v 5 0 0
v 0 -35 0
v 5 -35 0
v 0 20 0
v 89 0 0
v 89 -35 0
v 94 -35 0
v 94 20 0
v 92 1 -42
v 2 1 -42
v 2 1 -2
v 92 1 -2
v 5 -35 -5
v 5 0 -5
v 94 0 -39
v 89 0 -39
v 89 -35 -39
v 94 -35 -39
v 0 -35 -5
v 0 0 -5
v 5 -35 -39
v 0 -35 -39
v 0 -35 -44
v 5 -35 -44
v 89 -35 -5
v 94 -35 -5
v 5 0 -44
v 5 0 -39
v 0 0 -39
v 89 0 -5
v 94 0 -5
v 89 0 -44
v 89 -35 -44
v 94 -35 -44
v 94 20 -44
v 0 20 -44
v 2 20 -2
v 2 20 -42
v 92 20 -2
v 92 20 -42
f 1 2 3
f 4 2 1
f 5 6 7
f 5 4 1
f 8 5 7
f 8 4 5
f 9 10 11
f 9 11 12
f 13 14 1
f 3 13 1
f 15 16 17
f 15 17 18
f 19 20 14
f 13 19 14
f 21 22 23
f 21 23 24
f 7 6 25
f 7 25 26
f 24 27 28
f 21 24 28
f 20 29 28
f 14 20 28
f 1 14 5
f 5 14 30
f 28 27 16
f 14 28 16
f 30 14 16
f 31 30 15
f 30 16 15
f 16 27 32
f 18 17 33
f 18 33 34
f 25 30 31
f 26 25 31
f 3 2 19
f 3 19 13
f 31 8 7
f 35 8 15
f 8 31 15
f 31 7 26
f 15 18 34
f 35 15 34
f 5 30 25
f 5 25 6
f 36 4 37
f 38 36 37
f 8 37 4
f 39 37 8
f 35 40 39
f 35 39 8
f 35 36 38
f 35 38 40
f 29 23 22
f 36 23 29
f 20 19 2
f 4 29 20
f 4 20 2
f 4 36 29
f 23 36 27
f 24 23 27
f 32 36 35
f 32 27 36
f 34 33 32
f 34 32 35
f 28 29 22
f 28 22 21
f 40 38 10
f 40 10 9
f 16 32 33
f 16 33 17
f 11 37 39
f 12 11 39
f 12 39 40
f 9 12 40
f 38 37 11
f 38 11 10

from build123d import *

# Parameters (mm, degrees)
SKETCH_1_W          = 94
SKETCH_1_H          = 44
EXTRUDE_2_DEPTH     = 20
SKETCH_2_W          = 90
SKETCH_2_H          = 40
CUT_EXTRUDE_1_DEPTH = 19
SKETCH_3_W          = 5
SKETCH_3_H          = 5
EXTRUDE_3_DEPTH     = 35


with BuildPart() as part:
    # 草图1 → 凸台-拉伸2 (new body)
    with BuildSketch(Plane(origin=(0, 0, 0), x_dir=(1, 0, 0), z_dir=(0, 1, 0))):
        with Locations((47, 22)):
            Rectangle(SKETCH_1_W, SKETCH_1_H)
    extrude(amount=EXTRUDE_2_DEPTH)

    # 草图2 → 切除-拉伸1 (cut)
    with BuildSketch(Plane(origin=(0, 20, 0), x_dir=(1, 0, 0), z_dir=(0, 1, 0))):
        with Locations((47, 22)):
            Rectangle(SKETCH_2_W, SKETCH_2_H)
    extrude(amount=-CUT_EXTRUDE_1_DEPTH, mode=Mode.SUBTRACT)

    # 草图3 → 凸台-拉伸3 (add)
    with BuildSketch(Plane.XZ):
        with Locations((2.5, -2.5)):
            Rectangle(SKETCH_3_W, SKETCH_3_H)
        with Locations((91.5, -2.5)):
            Rectangle(SKETCH_3_W, SKETCH_3_H)
        with Locations((91.5, -41.5)):
            Rectangle(SKETCH_3_W, SKETCH_3_H)
        with Locations((2.5, -41.5)):
            Rectangle(SKETCH_3_W, SKETCH_3_H)
    extrude(amount=EXTRUDE_3_DEPTH)


solid = part.part
